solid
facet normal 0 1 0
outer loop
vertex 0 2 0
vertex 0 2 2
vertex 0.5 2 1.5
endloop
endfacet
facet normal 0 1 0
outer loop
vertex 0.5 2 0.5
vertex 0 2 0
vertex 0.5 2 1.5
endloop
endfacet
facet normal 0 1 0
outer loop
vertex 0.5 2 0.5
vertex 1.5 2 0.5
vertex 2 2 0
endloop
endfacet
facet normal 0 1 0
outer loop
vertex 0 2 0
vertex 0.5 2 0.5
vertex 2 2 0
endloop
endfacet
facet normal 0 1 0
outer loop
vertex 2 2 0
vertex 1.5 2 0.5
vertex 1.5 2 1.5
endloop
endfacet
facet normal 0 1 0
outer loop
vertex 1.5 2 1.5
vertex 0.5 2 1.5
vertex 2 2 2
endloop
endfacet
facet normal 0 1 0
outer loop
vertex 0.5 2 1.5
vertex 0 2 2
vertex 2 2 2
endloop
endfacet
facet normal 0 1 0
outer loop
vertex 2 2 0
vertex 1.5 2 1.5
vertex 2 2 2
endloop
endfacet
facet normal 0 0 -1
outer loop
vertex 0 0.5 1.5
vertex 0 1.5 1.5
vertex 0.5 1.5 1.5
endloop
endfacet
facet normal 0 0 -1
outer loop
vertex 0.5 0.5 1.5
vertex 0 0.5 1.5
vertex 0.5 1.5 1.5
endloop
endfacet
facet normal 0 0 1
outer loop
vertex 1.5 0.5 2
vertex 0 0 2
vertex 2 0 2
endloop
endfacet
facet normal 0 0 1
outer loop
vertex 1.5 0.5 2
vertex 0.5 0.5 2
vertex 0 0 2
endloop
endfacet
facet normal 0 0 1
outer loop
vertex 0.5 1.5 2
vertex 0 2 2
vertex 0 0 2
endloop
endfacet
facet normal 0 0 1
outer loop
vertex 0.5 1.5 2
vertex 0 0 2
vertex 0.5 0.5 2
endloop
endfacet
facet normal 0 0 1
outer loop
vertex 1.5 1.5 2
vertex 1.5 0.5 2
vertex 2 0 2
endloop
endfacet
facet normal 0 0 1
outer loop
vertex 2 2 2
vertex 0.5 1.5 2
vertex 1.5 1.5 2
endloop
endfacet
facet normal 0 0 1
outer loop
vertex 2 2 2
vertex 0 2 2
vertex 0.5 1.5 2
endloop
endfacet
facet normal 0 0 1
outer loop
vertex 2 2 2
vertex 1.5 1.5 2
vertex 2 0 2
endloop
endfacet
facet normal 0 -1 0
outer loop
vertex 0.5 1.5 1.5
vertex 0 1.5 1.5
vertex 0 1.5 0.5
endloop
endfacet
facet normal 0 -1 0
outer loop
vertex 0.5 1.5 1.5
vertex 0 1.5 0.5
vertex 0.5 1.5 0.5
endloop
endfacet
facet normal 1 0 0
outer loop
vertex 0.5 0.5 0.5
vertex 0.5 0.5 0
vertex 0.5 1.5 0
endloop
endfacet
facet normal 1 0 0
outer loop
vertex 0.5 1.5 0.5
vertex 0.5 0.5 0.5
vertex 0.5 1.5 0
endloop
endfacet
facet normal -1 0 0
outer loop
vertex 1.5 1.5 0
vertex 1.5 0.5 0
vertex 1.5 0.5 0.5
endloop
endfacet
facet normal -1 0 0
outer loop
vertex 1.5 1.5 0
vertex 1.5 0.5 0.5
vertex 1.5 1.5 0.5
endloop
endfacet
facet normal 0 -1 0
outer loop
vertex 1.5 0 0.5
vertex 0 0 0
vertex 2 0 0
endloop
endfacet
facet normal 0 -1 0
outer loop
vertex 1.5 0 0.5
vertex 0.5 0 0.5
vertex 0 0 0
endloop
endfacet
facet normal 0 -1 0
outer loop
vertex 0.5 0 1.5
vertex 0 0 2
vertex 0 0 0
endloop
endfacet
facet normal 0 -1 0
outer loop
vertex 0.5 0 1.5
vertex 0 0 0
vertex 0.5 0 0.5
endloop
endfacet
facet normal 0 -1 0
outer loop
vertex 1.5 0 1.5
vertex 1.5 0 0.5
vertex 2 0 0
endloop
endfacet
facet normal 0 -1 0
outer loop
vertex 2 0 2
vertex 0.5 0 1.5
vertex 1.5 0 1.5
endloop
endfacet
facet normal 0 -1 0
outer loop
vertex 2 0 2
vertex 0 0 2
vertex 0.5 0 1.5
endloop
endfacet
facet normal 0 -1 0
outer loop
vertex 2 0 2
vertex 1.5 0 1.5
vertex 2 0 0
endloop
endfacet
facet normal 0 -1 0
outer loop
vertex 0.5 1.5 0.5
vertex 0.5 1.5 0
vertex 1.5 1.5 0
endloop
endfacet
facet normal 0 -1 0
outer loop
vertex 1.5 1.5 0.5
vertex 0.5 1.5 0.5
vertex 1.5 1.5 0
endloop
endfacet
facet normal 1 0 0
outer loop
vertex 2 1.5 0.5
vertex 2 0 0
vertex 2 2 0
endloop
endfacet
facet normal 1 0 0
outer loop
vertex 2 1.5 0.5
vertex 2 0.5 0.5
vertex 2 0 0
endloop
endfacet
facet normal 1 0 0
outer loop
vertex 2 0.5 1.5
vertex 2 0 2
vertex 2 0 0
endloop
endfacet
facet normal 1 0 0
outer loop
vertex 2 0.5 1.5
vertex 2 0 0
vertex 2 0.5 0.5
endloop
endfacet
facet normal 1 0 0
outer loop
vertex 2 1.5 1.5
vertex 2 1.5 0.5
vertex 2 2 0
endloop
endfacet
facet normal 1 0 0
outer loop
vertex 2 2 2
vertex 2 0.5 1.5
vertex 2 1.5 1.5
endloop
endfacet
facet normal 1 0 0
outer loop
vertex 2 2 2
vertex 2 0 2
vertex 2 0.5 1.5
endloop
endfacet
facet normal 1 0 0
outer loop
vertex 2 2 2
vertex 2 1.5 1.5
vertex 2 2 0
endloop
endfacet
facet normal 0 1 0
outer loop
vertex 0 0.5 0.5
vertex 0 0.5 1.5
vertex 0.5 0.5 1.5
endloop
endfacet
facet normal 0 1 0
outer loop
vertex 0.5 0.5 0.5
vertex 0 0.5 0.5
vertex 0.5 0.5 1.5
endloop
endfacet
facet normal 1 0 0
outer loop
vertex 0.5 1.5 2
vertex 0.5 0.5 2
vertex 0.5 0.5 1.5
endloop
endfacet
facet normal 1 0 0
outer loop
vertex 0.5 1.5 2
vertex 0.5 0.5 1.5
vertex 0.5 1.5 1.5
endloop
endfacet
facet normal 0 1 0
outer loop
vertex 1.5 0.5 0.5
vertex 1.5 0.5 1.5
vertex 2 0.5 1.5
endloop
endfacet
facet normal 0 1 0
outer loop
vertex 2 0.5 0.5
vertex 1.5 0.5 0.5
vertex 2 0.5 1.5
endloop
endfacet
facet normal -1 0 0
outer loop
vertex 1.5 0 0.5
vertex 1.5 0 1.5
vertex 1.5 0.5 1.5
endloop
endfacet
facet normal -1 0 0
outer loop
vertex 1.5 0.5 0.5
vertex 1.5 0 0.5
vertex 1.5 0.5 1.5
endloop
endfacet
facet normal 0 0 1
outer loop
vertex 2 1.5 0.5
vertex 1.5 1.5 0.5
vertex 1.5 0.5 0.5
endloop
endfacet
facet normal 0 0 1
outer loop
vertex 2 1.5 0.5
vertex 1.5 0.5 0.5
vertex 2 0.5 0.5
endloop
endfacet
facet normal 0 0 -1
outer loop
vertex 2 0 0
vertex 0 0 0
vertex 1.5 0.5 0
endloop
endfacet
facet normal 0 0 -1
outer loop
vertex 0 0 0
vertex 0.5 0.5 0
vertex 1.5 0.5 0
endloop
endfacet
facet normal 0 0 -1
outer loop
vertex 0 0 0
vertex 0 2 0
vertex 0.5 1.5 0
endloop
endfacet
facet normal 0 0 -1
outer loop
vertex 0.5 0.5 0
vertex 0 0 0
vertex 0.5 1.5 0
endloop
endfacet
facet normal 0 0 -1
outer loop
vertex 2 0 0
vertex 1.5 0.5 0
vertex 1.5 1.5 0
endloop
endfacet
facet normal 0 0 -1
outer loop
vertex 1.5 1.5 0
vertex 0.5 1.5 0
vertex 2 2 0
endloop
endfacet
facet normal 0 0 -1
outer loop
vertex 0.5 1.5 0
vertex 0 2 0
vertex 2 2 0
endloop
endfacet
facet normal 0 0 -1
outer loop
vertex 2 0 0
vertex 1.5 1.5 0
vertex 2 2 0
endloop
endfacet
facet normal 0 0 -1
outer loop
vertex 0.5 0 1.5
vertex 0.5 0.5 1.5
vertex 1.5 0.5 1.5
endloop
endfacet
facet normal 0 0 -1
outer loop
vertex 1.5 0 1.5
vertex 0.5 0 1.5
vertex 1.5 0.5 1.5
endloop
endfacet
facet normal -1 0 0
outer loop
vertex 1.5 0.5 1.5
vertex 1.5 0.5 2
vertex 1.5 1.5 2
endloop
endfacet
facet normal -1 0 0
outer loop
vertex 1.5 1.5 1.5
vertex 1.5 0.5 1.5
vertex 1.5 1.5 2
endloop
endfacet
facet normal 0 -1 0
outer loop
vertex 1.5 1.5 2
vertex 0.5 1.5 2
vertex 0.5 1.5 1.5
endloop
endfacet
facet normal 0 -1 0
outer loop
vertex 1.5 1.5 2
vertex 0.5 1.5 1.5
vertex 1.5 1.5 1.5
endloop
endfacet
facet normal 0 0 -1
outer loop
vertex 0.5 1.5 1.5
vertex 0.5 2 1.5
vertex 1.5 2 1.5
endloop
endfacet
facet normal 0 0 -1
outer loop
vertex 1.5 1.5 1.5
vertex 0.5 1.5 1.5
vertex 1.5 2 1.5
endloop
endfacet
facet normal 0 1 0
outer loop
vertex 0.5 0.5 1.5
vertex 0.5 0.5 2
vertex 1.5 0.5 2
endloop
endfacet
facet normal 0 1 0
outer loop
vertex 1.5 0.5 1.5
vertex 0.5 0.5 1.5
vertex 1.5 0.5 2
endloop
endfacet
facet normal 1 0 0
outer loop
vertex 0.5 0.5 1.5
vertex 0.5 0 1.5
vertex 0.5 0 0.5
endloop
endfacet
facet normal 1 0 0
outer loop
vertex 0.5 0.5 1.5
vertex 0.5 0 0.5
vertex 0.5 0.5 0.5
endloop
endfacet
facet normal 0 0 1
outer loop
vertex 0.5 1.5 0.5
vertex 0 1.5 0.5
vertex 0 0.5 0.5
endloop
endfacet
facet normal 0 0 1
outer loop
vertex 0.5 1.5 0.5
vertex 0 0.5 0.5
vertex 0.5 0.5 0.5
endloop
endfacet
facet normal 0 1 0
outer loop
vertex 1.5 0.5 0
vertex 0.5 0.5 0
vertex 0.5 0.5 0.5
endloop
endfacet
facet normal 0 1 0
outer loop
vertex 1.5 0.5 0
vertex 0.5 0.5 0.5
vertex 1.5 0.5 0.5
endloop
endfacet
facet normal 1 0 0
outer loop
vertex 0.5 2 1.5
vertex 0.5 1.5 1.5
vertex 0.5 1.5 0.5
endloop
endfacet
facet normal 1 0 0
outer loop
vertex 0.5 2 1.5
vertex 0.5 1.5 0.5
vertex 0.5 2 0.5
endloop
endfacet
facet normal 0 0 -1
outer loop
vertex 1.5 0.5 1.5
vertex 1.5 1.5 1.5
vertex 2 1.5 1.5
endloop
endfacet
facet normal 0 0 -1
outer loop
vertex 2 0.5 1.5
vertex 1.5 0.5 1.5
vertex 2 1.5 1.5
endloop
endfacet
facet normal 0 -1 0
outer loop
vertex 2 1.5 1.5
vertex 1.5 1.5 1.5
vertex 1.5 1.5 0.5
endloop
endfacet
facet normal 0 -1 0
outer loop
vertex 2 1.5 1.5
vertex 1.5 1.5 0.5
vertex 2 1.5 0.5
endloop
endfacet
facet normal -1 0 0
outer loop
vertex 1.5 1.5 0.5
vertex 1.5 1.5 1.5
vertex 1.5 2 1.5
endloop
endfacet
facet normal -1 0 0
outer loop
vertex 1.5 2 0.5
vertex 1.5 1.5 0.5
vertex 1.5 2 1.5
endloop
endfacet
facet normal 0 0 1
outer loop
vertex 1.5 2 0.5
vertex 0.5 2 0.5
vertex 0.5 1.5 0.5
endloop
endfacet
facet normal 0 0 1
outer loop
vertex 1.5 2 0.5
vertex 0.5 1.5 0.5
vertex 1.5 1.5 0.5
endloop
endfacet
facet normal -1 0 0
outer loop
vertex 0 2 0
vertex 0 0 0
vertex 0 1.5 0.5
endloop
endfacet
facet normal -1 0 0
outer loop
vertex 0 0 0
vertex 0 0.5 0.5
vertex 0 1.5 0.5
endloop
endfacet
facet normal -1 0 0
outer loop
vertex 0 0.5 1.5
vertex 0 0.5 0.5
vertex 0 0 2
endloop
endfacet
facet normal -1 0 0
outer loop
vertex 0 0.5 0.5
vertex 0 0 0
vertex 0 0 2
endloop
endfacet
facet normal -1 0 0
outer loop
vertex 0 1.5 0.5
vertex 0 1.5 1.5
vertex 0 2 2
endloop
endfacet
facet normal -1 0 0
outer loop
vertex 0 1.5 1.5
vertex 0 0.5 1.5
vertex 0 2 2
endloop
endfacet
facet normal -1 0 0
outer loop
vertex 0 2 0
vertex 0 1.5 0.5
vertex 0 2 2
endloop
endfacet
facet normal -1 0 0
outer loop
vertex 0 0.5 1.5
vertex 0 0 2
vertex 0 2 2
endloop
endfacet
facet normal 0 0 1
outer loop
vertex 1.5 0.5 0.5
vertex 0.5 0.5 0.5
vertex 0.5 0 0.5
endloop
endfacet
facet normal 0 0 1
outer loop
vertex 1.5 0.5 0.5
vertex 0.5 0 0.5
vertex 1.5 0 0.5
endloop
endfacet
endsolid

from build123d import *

# Parameters (mm, degrees)
F0_W     = 2
F0_H     = 2
F0_W_2   = 1
F0_H_2   = 1
F1_DEPTH = 0.5
F2_W     = 0.5
F2_H     = 0.5
F3_DEPTH = 0.5


with BuildPart() as f1:
    # F0 (on Top) → F1 (new body)
    with BuildSketch(Plane.XY):
        with Locations((1, 1)):
            Rectangle(F0_W, F0_H)
        with Locations((1, 1)):
            Rectangle(F0_W_2, F0_H_2, mode=Mode.SUBTRACT)
    extrude(amount=F1_DEPTH)

    # F2 (on face) → F3 (join)
    with BuildSketch(Plane.XY.offset(0.5)):
        with Locations((0.25, 1.75)):
            Rectangle(F2_W, F2_H)
        with Locations((0.25, 0.25)):
            Rectangle(F2_W, F2_H)
        with Locations((1.75, 0.25)):
            Rectangle(F2_W, F2_H)
        with Locations((1.75, 1.75)):
            Rectangle(F2_W, F2_H)
    extrude(amount=F3_DEPTH)

    # F4: F1 across face


with BuildPart() as f1_1:
    add(f1.part)
    add(f1.part.mirror(Plane(origin=(0.25, 0.25, 1), x_dir=(1, 0, 0), z_dir=(0, 0, 1))))


solid = f1_1.part
